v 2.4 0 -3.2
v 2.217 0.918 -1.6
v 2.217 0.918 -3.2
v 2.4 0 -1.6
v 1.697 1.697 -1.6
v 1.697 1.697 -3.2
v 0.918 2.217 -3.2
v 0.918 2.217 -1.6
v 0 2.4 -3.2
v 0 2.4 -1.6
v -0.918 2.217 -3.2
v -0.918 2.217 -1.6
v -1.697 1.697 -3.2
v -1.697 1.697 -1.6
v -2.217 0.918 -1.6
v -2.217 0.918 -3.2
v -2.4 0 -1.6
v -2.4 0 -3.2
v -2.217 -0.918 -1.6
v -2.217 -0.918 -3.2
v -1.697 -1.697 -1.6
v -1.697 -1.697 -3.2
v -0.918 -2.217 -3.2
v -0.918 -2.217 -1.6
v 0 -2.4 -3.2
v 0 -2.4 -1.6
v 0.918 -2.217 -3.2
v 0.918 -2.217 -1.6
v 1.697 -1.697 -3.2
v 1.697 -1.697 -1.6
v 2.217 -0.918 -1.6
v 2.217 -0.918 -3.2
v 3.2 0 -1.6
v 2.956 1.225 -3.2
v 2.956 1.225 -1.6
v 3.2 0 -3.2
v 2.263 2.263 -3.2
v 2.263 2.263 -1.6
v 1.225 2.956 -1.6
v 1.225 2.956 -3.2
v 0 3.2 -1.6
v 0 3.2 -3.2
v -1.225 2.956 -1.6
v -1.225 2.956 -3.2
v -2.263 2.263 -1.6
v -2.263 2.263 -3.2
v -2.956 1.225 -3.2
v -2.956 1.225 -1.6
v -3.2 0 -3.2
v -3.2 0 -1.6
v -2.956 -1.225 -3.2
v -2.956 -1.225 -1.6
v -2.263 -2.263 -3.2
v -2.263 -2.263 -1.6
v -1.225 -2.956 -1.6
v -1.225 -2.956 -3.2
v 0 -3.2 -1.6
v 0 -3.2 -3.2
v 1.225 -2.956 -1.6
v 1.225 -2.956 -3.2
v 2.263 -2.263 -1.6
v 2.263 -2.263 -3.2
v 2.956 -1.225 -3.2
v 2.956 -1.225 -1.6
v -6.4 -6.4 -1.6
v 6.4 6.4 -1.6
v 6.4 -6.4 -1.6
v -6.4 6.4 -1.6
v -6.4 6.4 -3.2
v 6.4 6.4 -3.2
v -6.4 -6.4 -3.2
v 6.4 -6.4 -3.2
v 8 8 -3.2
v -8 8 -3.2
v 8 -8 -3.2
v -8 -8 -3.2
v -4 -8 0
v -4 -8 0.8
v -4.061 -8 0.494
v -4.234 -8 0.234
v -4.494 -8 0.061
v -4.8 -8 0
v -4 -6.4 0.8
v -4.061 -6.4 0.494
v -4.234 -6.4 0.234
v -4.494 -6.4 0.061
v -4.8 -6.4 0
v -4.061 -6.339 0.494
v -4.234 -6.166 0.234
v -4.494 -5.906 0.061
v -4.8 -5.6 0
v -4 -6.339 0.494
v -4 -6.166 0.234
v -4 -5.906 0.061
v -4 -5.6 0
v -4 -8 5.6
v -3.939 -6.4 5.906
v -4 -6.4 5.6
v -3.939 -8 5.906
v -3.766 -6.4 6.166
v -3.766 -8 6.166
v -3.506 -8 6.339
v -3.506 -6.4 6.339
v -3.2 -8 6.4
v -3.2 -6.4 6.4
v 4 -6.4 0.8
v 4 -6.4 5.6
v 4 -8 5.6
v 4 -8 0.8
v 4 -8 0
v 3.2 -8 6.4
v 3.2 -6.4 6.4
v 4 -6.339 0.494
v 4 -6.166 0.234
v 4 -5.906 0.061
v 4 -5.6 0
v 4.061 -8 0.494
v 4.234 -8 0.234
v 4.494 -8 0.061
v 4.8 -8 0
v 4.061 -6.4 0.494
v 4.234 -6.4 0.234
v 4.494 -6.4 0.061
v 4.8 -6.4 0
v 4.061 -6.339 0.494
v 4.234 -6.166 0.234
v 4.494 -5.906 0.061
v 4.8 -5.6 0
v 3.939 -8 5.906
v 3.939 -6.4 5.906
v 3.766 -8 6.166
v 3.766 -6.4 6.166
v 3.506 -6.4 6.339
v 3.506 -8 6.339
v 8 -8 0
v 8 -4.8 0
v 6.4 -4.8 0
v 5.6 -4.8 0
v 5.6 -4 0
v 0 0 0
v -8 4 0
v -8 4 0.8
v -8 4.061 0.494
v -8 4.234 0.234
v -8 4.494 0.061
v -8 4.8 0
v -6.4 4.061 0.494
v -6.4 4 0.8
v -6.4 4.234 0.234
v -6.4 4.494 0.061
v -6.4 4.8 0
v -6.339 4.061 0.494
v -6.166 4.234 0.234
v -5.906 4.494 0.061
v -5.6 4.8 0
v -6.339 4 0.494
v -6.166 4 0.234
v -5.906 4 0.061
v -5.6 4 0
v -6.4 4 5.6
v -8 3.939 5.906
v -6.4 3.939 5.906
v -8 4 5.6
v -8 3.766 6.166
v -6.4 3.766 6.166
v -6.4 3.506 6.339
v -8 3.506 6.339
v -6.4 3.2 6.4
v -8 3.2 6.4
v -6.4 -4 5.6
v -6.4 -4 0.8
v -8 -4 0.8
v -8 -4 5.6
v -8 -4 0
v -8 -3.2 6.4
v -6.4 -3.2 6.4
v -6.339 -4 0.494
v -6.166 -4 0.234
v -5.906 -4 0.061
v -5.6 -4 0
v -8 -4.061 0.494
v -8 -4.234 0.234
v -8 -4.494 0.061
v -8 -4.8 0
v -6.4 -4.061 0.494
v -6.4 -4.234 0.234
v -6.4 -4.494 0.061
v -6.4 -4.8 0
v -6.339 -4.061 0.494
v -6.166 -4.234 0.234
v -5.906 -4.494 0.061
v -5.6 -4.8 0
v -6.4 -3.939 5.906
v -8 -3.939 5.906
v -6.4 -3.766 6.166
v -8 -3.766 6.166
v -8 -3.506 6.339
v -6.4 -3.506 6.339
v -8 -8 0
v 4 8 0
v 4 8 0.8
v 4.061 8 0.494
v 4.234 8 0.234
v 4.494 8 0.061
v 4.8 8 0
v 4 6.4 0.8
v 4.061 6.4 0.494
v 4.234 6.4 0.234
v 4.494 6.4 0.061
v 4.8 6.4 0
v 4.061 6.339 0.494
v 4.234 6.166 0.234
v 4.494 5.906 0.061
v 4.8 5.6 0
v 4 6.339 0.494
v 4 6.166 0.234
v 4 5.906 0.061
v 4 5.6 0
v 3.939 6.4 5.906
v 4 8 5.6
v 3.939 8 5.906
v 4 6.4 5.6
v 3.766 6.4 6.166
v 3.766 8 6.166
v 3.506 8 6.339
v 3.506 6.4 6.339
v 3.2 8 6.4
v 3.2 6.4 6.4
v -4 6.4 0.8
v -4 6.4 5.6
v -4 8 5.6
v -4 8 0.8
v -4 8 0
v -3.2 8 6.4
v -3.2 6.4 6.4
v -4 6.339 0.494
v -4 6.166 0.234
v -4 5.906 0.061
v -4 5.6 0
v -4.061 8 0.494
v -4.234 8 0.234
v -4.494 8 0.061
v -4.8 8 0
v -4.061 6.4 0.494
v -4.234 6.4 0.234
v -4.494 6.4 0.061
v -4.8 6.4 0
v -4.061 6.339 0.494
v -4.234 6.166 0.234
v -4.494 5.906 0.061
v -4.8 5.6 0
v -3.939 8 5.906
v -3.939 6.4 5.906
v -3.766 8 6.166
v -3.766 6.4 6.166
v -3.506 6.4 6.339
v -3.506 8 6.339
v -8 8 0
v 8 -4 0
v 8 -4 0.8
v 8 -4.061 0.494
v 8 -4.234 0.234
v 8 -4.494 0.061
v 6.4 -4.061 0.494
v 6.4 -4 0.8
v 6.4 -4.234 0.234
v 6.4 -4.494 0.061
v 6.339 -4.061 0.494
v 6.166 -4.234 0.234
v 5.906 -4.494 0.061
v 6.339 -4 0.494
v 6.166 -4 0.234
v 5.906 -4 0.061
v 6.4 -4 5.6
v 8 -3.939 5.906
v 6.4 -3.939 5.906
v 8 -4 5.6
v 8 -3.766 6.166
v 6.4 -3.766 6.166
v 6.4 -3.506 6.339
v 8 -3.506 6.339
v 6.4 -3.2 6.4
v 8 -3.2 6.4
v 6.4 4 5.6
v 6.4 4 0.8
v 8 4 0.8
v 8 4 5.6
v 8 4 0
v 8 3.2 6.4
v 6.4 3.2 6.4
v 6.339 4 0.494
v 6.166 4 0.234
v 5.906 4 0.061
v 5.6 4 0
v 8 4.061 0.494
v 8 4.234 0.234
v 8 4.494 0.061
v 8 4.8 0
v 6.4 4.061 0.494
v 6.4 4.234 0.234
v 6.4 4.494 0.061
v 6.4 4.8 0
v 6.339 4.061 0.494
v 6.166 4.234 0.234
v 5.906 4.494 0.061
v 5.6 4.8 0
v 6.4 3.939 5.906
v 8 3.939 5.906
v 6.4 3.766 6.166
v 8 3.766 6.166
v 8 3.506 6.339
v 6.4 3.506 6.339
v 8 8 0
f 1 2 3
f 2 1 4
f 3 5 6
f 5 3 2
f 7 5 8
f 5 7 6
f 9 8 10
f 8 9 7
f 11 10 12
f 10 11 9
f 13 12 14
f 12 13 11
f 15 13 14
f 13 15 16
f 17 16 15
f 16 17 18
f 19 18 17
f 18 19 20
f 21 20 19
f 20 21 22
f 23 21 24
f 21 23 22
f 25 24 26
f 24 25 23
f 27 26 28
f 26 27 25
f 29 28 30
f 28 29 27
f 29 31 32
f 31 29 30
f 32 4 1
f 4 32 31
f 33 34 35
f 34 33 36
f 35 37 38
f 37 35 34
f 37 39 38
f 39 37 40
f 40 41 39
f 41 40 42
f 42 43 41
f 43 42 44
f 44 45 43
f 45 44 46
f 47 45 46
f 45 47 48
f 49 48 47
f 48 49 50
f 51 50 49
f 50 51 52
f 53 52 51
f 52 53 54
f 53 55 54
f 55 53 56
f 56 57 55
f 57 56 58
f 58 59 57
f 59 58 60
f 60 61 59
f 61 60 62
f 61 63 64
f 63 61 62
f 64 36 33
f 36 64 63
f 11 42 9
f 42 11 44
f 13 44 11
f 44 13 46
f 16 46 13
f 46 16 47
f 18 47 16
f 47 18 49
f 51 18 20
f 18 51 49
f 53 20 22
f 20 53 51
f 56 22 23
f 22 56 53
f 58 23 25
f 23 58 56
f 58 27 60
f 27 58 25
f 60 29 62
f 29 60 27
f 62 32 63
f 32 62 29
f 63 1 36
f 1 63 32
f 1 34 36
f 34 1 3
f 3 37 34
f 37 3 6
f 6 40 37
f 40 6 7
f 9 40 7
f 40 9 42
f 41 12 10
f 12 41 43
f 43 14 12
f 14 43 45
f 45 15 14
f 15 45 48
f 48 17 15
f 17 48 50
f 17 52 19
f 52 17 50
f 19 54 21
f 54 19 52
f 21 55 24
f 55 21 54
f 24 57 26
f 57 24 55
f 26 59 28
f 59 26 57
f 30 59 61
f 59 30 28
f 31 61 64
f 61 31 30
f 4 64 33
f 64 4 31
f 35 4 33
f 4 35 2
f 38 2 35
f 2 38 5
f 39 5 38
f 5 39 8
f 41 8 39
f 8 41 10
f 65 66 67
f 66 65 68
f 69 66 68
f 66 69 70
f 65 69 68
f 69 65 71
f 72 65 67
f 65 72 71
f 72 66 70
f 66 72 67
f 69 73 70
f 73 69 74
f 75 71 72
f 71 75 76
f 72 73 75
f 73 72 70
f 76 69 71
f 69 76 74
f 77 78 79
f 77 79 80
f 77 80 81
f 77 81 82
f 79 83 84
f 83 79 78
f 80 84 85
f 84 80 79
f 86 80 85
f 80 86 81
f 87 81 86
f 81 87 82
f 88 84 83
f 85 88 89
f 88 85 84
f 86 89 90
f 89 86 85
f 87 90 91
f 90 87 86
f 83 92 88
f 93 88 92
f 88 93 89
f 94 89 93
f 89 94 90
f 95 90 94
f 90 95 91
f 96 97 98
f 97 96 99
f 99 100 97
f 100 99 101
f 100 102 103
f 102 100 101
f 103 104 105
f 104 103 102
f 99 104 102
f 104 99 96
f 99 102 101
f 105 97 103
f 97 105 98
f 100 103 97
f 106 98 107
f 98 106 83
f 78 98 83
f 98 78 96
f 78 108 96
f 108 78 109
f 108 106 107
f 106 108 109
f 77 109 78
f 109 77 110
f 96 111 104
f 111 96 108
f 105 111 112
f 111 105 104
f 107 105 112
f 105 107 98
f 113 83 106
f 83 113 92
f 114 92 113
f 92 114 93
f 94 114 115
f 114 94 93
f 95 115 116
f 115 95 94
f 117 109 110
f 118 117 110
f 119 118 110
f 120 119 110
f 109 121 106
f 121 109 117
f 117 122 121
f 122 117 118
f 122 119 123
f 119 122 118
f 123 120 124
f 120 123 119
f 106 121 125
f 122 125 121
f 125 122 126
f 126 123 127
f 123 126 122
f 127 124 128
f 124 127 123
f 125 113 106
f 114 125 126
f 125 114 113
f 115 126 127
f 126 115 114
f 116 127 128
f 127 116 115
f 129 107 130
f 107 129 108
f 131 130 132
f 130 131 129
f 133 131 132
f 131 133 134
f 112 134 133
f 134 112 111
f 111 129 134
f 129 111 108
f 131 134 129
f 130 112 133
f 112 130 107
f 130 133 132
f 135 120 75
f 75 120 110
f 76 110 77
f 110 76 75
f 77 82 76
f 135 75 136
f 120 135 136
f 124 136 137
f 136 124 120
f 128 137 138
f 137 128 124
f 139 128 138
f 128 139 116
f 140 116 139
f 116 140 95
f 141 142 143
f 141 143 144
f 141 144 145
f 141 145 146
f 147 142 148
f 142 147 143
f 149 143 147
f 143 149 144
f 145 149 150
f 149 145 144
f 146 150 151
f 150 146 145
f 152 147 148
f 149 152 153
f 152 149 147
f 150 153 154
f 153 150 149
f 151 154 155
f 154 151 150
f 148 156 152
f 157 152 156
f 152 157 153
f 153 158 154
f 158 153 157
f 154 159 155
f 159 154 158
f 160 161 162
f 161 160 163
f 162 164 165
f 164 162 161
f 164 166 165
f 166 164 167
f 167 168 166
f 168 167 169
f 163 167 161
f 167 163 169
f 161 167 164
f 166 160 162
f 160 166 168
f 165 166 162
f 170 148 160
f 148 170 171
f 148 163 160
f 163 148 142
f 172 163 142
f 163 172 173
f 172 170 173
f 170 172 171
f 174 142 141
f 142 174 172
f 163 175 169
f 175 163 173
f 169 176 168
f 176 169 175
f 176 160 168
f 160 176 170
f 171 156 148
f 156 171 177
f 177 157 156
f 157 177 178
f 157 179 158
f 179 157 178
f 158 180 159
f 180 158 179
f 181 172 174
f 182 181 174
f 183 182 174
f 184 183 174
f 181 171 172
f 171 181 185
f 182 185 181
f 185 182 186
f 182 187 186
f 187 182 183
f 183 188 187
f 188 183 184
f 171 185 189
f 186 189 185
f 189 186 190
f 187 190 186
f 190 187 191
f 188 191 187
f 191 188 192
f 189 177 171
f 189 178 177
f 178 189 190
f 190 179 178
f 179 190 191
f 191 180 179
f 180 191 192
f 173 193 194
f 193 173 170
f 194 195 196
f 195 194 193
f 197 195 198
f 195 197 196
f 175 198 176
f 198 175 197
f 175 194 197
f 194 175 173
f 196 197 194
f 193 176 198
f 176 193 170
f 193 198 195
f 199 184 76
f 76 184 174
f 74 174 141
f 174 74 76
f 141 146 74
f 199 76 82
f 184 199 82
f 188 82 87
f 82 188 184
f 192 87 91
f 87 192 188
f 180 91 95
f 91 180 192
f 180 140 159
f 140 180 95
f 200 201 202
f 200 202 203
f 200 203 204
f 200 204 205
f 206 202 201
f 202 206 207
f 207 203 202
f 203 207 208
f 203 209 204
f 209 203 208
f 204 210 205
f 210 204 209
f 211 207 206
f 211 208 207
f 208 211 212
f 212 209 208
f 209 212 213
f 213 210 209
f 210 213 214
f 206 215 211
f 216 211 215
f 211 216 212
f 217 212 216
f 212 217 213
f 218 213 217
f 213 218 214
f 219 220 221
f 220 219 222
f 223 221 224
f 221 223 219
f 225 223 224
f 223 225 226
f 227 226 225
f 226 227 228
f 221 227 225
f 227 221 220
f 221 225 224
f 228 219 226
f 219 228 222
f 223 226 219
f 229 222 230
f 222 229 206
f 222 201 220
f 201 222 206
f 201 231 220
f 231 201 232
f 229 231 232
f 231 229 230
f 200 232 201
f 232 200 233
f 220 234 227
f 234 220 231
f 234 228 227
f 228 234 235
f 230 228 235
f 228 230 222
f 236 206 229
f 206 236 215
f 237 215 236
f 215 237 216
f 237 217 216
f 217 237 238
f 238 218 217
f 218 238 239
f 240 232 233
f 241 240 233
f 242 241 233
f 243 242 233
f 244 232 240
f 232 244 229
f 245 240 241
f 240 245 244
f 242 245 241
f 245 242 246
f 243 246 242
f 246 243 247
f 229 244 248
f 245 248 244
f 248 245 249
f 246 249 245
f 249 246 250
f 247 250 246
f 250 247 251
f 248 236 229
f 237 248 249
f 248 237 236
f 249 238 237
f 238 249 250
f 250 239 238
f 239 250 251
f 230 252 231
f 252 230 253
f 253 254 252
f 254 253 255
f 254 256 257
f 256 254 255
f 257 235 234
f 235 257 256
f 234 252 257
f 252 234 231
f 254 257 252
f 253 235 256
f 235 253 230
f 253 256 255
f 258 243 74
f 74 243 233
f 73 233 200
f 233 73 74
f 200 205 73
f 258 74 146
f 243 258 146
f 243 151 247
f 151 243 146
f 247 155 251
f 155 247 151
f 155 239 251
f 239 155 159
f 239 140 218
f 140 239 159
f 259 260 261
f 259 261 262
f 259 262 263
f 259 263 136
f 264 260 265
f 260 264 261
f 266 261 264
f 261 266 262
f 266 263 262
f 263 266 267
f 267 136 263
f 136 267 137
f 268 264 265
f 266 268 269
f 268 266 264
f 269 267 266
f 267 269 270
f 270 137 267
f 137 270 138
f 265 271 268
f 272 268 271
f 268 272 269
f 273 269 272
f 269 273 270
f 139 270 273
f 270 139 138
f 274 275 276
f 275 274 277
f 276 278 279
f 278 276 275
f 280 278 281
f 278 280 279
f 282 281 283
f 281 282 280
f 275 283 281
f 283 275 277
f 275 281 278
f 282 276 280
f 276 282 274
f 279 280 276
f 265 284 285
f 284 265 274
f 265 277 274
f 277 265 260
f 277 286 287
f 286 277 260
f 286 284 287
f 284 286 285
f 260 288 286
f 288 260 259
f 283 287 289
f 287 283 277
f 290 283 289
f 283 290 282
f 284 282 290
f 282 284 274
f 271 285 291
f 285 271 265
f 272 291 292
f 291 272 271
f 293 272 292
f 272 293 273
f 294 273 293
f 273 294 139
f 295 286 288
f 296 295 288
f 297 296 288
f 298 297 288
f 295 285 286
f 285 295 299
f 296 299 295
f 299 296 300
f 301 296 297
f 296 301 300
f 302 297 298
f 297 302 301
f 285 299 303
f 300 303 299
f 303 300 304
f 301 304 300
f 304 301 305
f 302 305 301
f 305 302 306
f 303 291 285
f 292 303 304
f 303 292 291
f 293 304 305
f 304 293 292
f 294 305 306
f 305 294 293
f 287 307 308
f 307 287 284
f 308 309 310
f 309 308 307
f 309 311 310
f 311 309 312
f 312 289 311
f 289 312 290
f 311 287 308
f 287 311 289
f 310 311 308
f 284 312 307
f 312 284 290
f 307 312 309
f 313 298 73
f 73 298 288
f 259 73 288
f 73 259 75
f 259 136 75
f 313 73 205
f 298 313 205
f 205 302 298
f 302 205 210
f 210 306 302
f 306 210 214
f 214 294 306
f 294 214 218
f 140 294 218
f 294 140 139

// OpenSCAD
// file: ../p/4-4ring3.scad
use <../lib.scad>
$fa=1; $fs=0.2;
function ldraw_lib__4_4ring3(realsolid=false) = [
// 0 Ring  3 x 1.0
// 0 Name: 4-4ring3.dat
// 0 Author: James Jessiman
// 0 !LDRAW_ORG Primitive UPDATE 2009-01
// 0 !LICENSE Licensed under CC BY 2.0 and CC BY 4.0 : see CAreadme.txt
// 
// 0 BFC CERTIFY CCW
  [0,"BFC","CERTIFY"],
  [0,"BFC","CCW"],
// 
// 0 !HISTORY 1998-12-15 [PTadmin] Official Update 1998-10
// 0 !HISTORY 2002-04-05 [hafhead] Added BFC statement
// 0 !HISTORY 2002-04-25 [PTadmin] Official Update 2002-02
// 0 !HISTORY 2007-06-24 [PTadmin] Header formatted for Contributor Agreement
// 0 !HISTORY 2008-07-01 [PTadmin] Official Update 2008-01
// 0 !HISTORY 2008-08-26 [cwdee] Switch polygon winding and rename
// 0 !HISTORY 2009-05-02 [PTadmin] Official Update 2009-01
// 
// 
// 4 16 -1.5308 0 3.6956 -1.1481 0 2.7717 0 0 3 0 0 4
  [4,16,-1.5308,0,3.6956,-1.1481,0,2.7717,0,0,3,0,0,4],
// 4 16 -2.8284 0 2.8284 -2.1213 0 2.1213 -1.1481 0 2.7717 -1.5308 0 3.6956
  [4,16,-2.8284,0,2.8284,-2.1213,0,2.1213,-1.1481,0,2.7717,-1.5308,0,3.6956],
// 4 16 -3.6956 0 1.5308 -2.7717 0 1.1481 -2.1213 0 2.1213 -2.8284 0 2.8284
  [4,16,-3.6956,0,1.5308,-2.7717,0,1.1481,-2.1213,0,2.1213,-2.8284,0,2.8284],
// 4 16 -4 0 0 -3 0 0 -2.7717 0 1.1481 -3.6956 0 1.5308
  [4,16,-4,0,0,-3,0,0,-2.7717,0,1.1481,-3.6956,0,1.5308],
// 4 16 -3.6956 0 -1.5308 -2.7717 0 -1.1481 -3 0 0 -4 0 0
  [4,16,-3.6956,0,-1.5308,-2.7717,0,-1.1481,-3,0,0,-4,0,0],
// 4 16 -2.8284 0 -2.8284 -2.1213 0 -2.1213 -2.7717 0 -1.1481 -3.6956 0 -1.5308
  [4,16,-2.8284,0,-2.8284,-2.1213,0,-2.1213,-2.7717,0,-1.1481,-3.6956,0,-1.5308],
// 4 16 -1.5308 0 -3.6956 -1.1481 0 -2.7717 -2.1213 0 -2.1213 -2.8284 0 -2.8284
  [4,16,-1.5308,0,-3.6956,-1.1481,0,-2.7717,-2.1213,0,-2.1213,-2.8284,0,-2.8284],
// 4 16 0 0 -4 0 0 -3 -1.1481 0 -2.7717 -1.5308 0 -3.6956
  [4,16,0,0,-4,0,0,-3,-1.1481,0,-2.7717,-1.5308,0,-3.6956],
// 4 16 1.5308 0 -3.6956 1.1481 0 -2.7717 0 0 -3 0 0 -4
  [4,16,1.5308,0,-3.6956,1.1481,0,-2.7717,0,0,-3,0,0,-4],
// 4 16 2.8284 0 -2.8284 2.1213 0 -2.1213 1.1481 0 -2.7717 1.5308 0 -3.6956
  [4,16,2.8284,0,-2.8284,2.1213,0,-2.1213,1.1481,0,-2.7717,1.5308,0,-3.6956],
// 4 16 3.6956 0 -1.5308 2.7717 0 -1.1481 2.1213 0 -2.1213 2.8284 0 -2.8284
  [4,16,3.6956,0,-1.5308,2.7717,0,-1.1481,2.1213,0,-2.1213,2.8284,0,-2.8284],
// 4 16 4 0 0 3 0 0 2.7717 0 -1.1481 3.6956 0 -1.5308
  [4,16,4,0,0,3,0,0,2.7717,0,-1.1481,3.6956,0,-1.5308],
// 4 16 3.6956 0 1.5308 2.7717 0 1.1481 3 0 0 4 0 0
  [4,16,3.6956,0,1.5308,2.7717,0,1.1481,3,0,0,4,0,0],
// 4 16 2.8284 0 2.8284 2.1213 0 2.1213 2.7717 0 1.1481 3.6956 0 1.5308
  [4,16,2.8284,0,2.8284,2.1213,0,2.1213,2.7717,0,1.1481,3.6956,0,1.5308],
// 4 16 1.5308 0 3.6956 1.1481 0 2.7717 2.1213 0 2.1213 2.8284 0 2.8284
  [4,16,1.5308,0,3.6956,1.1481,0,2.7717,2.1213,0,2.1213,2.8284,0,2.8284],
// 4 16 0 0 4 0 0 3 1.1481 0 2.7717 1.5308 0 3.6956
  [4,16,0,0,4,0,0,3,1.1481,0,2.7717,1.5308,0,3.6956],
// 0
];
module ldraw_lib__4_4ring3(step=0, col=false, unit=2/5, alt=false, line=0.2, solid=!$preview)
    makepoly(ldraw_lib__4_4ring3(solid), step=step, col=col, unit=unit, alt=alt, line=line, solid=solid);
ldraw_lib__4_4ring3(line=0.2);
// file: ../p/4-4edge.scad
use <../lib.scad>
function ldraw_lib__4_4edge() = [
// 0 Circle 1.0
// 0 Name: 4-4edge.dat
// 0 Author: James Jessiman
// 0 !LDRAW_ORG Primitive UPDATE 2017-01
// 0 !LICENSE Licensed under CC BY 2.0 and CC BY 4.0 : see CAreadme.txt
// 
// 0 BFC CERTIFY CCW
  [0,"BFC","CERTIFY"],
  [0,"BFC","CCW"],
// 
// 0 !HISTORY 1998-12-15 [PTadmin] Official Update 1998-10
// 0 !HISTORY 2005-12-28 [PTadmin] Official Update 2005-01
// 0 !HISTORY 2007-06-24 [PTadmin] Header formatted for Contributor Agreement
// 0 !HISTORY 2008-07-01 [PTadmin] Official Update 2008-01
// 0 !HISTORY 2017-01-15 [Steffen] BFCed
// 0 !HISTORY 2017-12-30 [PTadmin] Official Update 2017-01
// 
// 
// 2 24 1 0 0 0.9239 0 0.3827
  [2,24,1,0,0,0.9239,0,0.3827],
// 2 24 0.9239 0 0.3827 0.7071 0 0.7071
  [2,24,0.9239,0,0.3827,0.7071,0,0.7071],
// 2 24 0.7071 0 0.7071 0.3827 0 0.9239
  [2,24,0.7071,0,0.7071,0.3827,0,0.9239],
// 2 24 0.3827 0 0.9239 0 0 1
  [2,24,0.3827,0,0.9239,0,0,1],
// 2 24 0 0 1 -0.3827 0 0.9239
  [2,24,0,0,1,-0.3827,0,0.9239],
// 2 24 -0.3827 0 0.9239 -0.7071 0 0.7071
  [2,24,-0.3827,0,0.9239,-0.7071,0,0.7071],
// 2 24 -0.7071 0 0.7071 -0.9239 0 0.3827
  [2,24,-0.7071,0,0.7071,-0.9239,0,0.3827],
// 2 24 -0.9239 0 0.3827 -1 0 -0
  [2,24,-0.9239,0,0.3827,-1,0,-0],
// 2 24 -1 0 -0 -0.9239 0 -0.3827
  [2,24,-1,0,-0,-0.9239,0,-0.3827],
// 2 24 -0.9239 0 -0.3827 -0.7071 0 -0.7071
  [2,24,-0.9239,0,-0.3827,-0.7071,0,-0.7071],
// 2 24 -0.7071 0 -0.7071 -0.3827 0 -0.9239
  [2,24,-0.7071,0,-0.7071,-0.3827,0,-0.9239],
// 2 24 -0.3827 0 -0.9239 0 0 -1
  [2,24,-0.3827,0,-0.9239,0,0,-1],
// 2 24 0 0 -1 0.3827 0 -0.9239
  [2,24,0,0,-1,0.3827,0,-0.9239],
// 2 24 0.3827 0 -0.9239 0.7071 0 -0.7071
  [2,24,0.3827,0,-0.9239,0.7071,0,-0.7071],
// 2 24 0.7071 0 -0.7071 0.9239 0 -0.3827
  [2,24,0.7071,0,-0.7071,0.9239,0,-0.3827],
// 2 24 0.9239 0 -0.3827 1 0 0
  [2,24,0.9239,0,-0.3827,1,0,0],
];
module ldraw_lib__4_4edge(step=0, col=false, unit=2/5, alt=false, line=0.2, solid=!$preview)
    makepoly(ldraw_lib__4_4edge(), step=step, col=col, unit=unit, alt=alt, line=line, solid=solid);
ldraw_lib__4_4edge(line=0.2);
// file: ../p/4-4cyli.scad
use <../lib.scad>
$fa=1; $fs=0.2;
function ldraw_lib__4_4cyli(realsolid=false) = [
// 0 Cylinder 1.0
// 0 Name: 4-4cyli.dat
// 0 Author: James Jessiman
// 0 !LDRAW_ORG Primitive UPDATE 2005-01
// 0 !LICENSE Licensed under CC BY 2.0 and CC BY 4.0 : see CAreadme.txt
// 
// 0 BFC CERTIFY CCW
  [0,"BFC","CERTIFY"],
  [0,"BFC","CCW"],
// 
// 0 !HISTORY 1998-12-15 [PTadmin] Official Update 1998-10
// 0 !HISTORY 2002-03-23 [sbliss] Added BFC statement; merged headers from files in distributions LDraw 0.27 and Complete.
// 0 !HISTORY 2002-04-25 [PTadmin] Official Update 2002-02
// 0 !HISTORY 2004-12-14 [guyvivan] BFC CCW
// 0 !HISTORY 2005-12-28 [PTadmin] Official Update 2005-01
// 0 !HISTORY 2007-06-24 [PTadmin] Header formatted for Contributor Agreement
// 0 !HISTORY 2008-07-01 [PTadmin] Official Update 2008-01
// 
// 
// 4 16 1 1 0 0.9239 1 0.3827 0.9239 0 0.3827 1 0 0
  [4,16,1,1,0,0.9239,1,0.3827,0.9239,0,0.3827,1,0,0],
// 5 24 1 0 0 1 1 0 0.9239 0 0.3827 0.9239 0 -0.3827
  [5,24,1,0,0,1,1,0,0.9239,0,0.3827,0.9239,0,-0.3827],
// 4 16 0.9239 1 0.3827 0.7071 1 0.7071 0.7071 0 0.7071 0.9239 0 0.3827
  [4,16,0.9239,1,0.3827,0.7071,1,0.7071,0.7071,0,0.7071,0.9239,0,0.3827],
// 5 24 0.9239 0 0.3827 0.9239 1 0.3827 0.7071 0 0.7071 1 0 0
  [5,24,0.9239,0,0.3827,0.9239,1,0.3827,0.7071,0,0.7071,1,0,0],
// 4 16 0.7071 1 0.7071 0.3827 1 0.9239 0.3827 0 0.9239 0.7071 0 0.7071
  [4,16,0.7071,1,0.7071,0.3827,1,0.9239,0.3827,0,0.9239,0.7071,0,0.7071],
// 5 24 0.7071 0 0.7071 0.7071 1 0.7071 0.3827 0 0.9239 0.9239 0 0.3827
  [5,24,0.7071,0,0.7071,0.7071,1,0.7071,0.3827,0,0.9239,0.9239,0,0.3827],
// 4 16 0.3827 1 0.9239 0 1 1 0 0 1 0.3827 0 0.9239
  [4,16,0.3827,1,0.9239,0,1,1,0,0,1,0.3827,0,0.9239],
// 5 24 0.3827 0 0.9239 0.3827 1 0.9239 0 0 1 0.7071 0 0.7071
  [5,24,0.3827,0,0.9239,0.3827,1,0.9239,0,0,1,0.7071,0,0.7071],
// 4 16 0 1 1 -0.3827 1 0.9239 -0.3827 0 0.9239 0 0 1
  [4,16,0,1,1,-0.3827,1,0.9239,-0.3827,0,0.9239,0,0,1],
// 5 24 0 0 1 0 1 1 -0.3827 0 0.9239 0.3827 0 0.9239
  [5,24,0,0,1,0,1,1,-0.3827,0,0.9239,0.3827,0,0.9239],
// 4 16 -0.3827 1 0.9239 -0.7071 1 0.7071 -0.7071 0 0.7071 -0.3827 0 0.9239
  [4,16,-0.3827,1,0.9239,-0.7071,1,0.7071,-0.7071,0,0.7071,-0.3827,0,0.9239],
// 5 24 -0.3827 0 0.9239 -0.3827 1 0.9239 -0.7071 0 0.7071 0 0 1
  [5,24,-0.3827,0,0.9239,-0.3827,1,0.9239,-0.7071,0,0.7071,0,0,1],
// 4 16 -0.7071 1 0.7071 -0.9239 1 0.3827 -0.9239 0 0.3827 -0.7071 0 0.7071
  [4,16,-0.7071,1,0.7071,-0.9239,1,0.3827,-0.9239,0,0.3827,-0.7071,0,0.7071],
// 5 24 -0.7071 0 0.7071 -0.7071 1 0.7071 -0.9239 0 0.3827 -0.3827 0 0.9239
  [5,24,-0.7071,0,0.7071,-0.7071,1,0.7071,-0.9239,0,0.3827,-0.3827,0,0.9239],
// 4 16 -0.9239 1 0.3827 -1 1 0 -1 0 0 -0.9239 0 0.3827
  [4,16,-0.9239,1,0.3827,-1,1,0,-1,0,0,-0.9239,0,0.3827],
// 5 24 -0.9239 0 0.3827 -0.9239 1 0.3827 -1 0 0 -0.7071 0 0.7071
  [5,24,-0.9239,0,0.3827,-0.9239,1,0.3827,-1,0,0,-0.7071,0,0.7071],
// 4 16 -1 1 0 -0.9239 1 -0.3827 -0.9239 0 -0.3827 -1 0 0
  [4,16,-1,1,0,-0.9239,1,-0.3827,-0.9239,0,-0.3827,-1,0,0],
// 5 24 -1 0 0 -1 1 0 -0.9239 0 -0.3827 -0.9239 0 0.3827
  [5,24,-1,0,0,-1,1,0,-0.9239,0,-0.3827,-0.9239,0,0.3827],
// 4 16 -0.9239 1 -0.3827 -0.7071 1 -0.7071 -0.7071 0 -0.7071 -0.9239 0 -0.3827
  [4,16,-0.9239,1,-0.3827,-0.7071,1,-0.7071,-0.7071,0,-0.7071,-0.9239,0,-0.3827],
// 5 24 -0.9239 0 -0.3827 -0.9239 1 -0.3827 -0.7071 0 -0.7071 -1 0 0
  [5,24,-0.9239,0,-0.3827,-0.9239,1,-0.3827,-0.7071,0,-0.7071,-1,0,0],
// 4 16 -0.7071 1 -0.7071 -0.3827 1 -0.9239 -0.3827 0 -0.9239 -0.7071 0 -0.7071
  [4,16,-0.7071,1,-0.7071,-0.3827,1,-0.9239,-0.3827,0,-0.9239,-0.7071,0,-0.7071],
// 5 24 -0.7071 0 -0.7071 -0.7071 1 -0.7071 -0.3827 0 -0.9239 -0.9239 0 -0.3827
  [5,24,-0.7071,0,-0.7071,-0.7071,1,-0.7071,-0.3827,0,-0.9239,-0.9239,0,-0.3827],
// 4 16 -0.3827 1 -0.9239 0 1 -1 0 0 -1 -0.3827 0 -0.9239
  [4,16,-0.3827,1,-0.9239,0,1,-1,0,0,-1,-0.3827,0,-0.9239],
// 5 24 -0.3827 0 -0.9239 -0.3827 1 -0.9239 0 0 -1 -0.7071 0 -0.7071
  [5,24,-0.3827,0,-0.9239,-0.3827,1,-0.9239,0,0,-1,-0.7071,0,-0.7071],
// 4 16 0 1 -1 0.3827 1 -0.9239 0.3827 0 -0.9239 0 0 -1
  [4,16,0,1,-1,0.3827,1,-0.9239,0.3827,0,-0.9239,0,0,-1],
// 5 24 0 0 -1 0 1 -1 0.3827 0 -0.9239 -0.3827 0 -0.9239
  [5,24,0,0,-1,0,1,-1,0.3827,0,-0.9239,-0.3827,0,-0.9239],
// 4 16 0.3827 1 -0.9239 0.7071 1 -0.7071 0.7071 0 -0.7071 0.3827 0 -0.9239
  [4,16,0.3827,1,-0.9239,0.7071,1,-0.7071,0.7071,0,-0.7071,0.3827,0,-0.9239],
// 5 24 0.3827 0 -0.9239 0.3827 1 -0.9239 0.7071 0 -0.7071 0 0 -1
  [5,24,0.3827,0,-0.9239,0.3827,1,-0.9239,0.7071,0,-0.7071,0,0,-1],
// 4 16 0.7071 1 -0.7071 0.9239 1 -0.3827 0.9239 0 -0.3827 0.7071 0 -0.7071
  [4,16,0.7071,1,-0.7071,0.9239,1,-0.3827,0.9239,0,-0.3827,0.7071,0,-0.7071],
// 5 24 0.7071 0 -0.7071 0.7071 1 -0.7071 0.9239 0 -0.3827 0.3827 0 -0.9239
  [5,24,0.7071,0,-0.7071,0.7071,1,-0.7071,0.9239,0,-0.3827,0.3827,0,-0.9239],
// 4 16 0.9239 1 -0.3827 1 1 0 1 0 0 0.9239 0 -0.3827
  [4,16,0.9239,1,-0.3827,1,1,0,1,0,0,0.9239,0,-0.3827],
// 5 24 0.9239 0 -0.3827 0.9239 1 -0.3827 1 0 0 0.7071 0 -0.7071
  [5,24,0.9239,0,-0.3827,0.9239,1,-0.3827,1,0,0,0.7071,0,-0.7071],
// 0
];
module ldraw_lib__4_4cyli(step=0, col=false, unit=2/5, alt=false, line=0.2, solid=!$preview)
    makepoly(ldraw_lib__4_4cyli(solid), step=step, col=col, unit=unit, alt=alt, line=line, solid=solid);
ldraw_lib__4_4cyli(line=0.2);
// file: ../p/box4o8a.scad
use <../lib.scad>
function ldraw_lib__box4o8a() = [
// 0 Box with 4 Faces (2 Parallel Pairs) without Top and Bottom Edges
// 0 Name: box4o8a.dat
// 0 Author: Steffen [Steffen]
// 0 !LDRAW_ORG Primitive UPDATE 2012-01
// 0 !LICENSE Licensed under CC BY 2.0 and CC BY 4.0 : see CAreadme.txt
// 
// 0 BFC CERTIFY CCW
  [0,"BFC","CERTIFY"],
  [0,"BFC","CCW"],
// 
// 0 !HISTORY 2004-04-22 [PTadmin] Official Update 2004-02
// 0 !HISTORY 2007-06-24 [PTadmin] Header formatted for Contributor Agreement
// 0 !HISTORY 2008-07-01 [PTadmin] Official Update 2008-01
// 0 !HISTORY 2012-02-16 [Philo] Changed to CCW
// 0 !HISTORY 2012-03-30 [PTadmin] Official Update 2012-01
// 
// 
// 2 24 1 0 1 1 1 1
  [2,24,1,0,1,1,1,1],
// 2 24 -1 0 1 -1 1 1
  [2,24,-1,0,1,-1,1,1],
// 2 24 1 0 -1 1 1 -1
  [2,24,1,0,-1,1,1,-1],
// 2 24 -1 0 -1 -1 1 -1
  [2,24,-1,0,-1,-1,1,-1],
// 4 16 -1 1 1 -1 0 1 1 0 1 1 1 1
  [4,16,-1,1,1,-1,0,1,1,0,1,1,1,1],
// 4 16 -1 1 -1 -1 0 -1 -1 0 1 -1 1 1
  [4,16,-1,1,-1,-1,0,-1,-1,0,1,-1,1,1],
// 4 16 1 1 -1 1 0 -1 -1 0 -1 -1 1 -1
  [4,16,1,1,-1,1,0,-1,-1,0,-1,-1,1,-1],
// 4 16 1 1 1 1 0 1 1 0 -1 1 1 -1
  [4,16,1,1,1,1,0,1,1,0,-1,1,1,-1],
];
makepoly(ldraw_lib__box4o8a(), line=0.2);
// file: ../p/1-4ndis.scad
use <../lib.scad>
function ldraw_lib__1_4ndis() = [
// 0 Disc Negative 0.25
// 0 Name: 1-4ndis.dat
// 0 Author: James Jessiman
// 0 !LDRAW_ORG Primitive UPDATE 2012-01
// 0 !LICENSE Licensed under CC BY 2.0 and CC BY 4.0 : see CAreadme.txt
// 
// 0 BFC CERTIFY CCW
  [0,"BFC","CERTIFY"],
  [0,"BFC","CCW"],
// 
// 0 !HISTORY 2002-03-23 [sbliss] Added BFC Statement
// 0 !HISTORY 2002-04-25 [PTadmin] Official Update 2002-02
// 0 !HISTORY 2007-06-22 [PTadmin] Header formatted for Contributor Agreement
// 0 !HISTORY 2008-07-01 [PTadmin] Official Update 2008-01
// 0 !HISTORY 2012-02-16 [Philo] Changed to CCW
// 0 !HISTORY 2012-03-30 [PTadmin] Official Update 2012-01
// 
// 
// 3 16 0.9239 0 0.3827 1 0 0 1 0 1
  [3,16,0.9239,0,0.3827,1,0,0,1,0,1],
// 3 16 0.7071 0 0.7071 0.9239 0 0.3827 1 0 1
  [3,16,0.7071,0,0.7071,0.9239,0,0.3827,1,0,1],
// 3 16 0.3827 0 0.9239 0.7071 0 0.7071 1 0 1
  [3,16,0.3827,0,0.9239,0.7071,0,0.7071,1,0,1],
// 3 16 0 0 1 0.3827 0 0.9239 1 0 1
  [3,16,0,0,1,0.3827,0,0.9239,1,0,1],
];
module ldraw_lib__1_4ndis(step=0, col=false, unit=2/5, alt=false, line=0.2, solid=!$preview)
    makepoly(ldraw_lib__1_4ndis(), step=step, col=col, unit=unit, alt=alt, line=line, solid=solid);
ldraw_lib__1_4ndis(line=0.2);
// file: ../p/1-4edge.scad
use <../lib.scad>
$fa=1; $fs=0.2;
function ldraw_lib__1_4edge(realsolid=false) = [
// 0 Circle 0.25
// 0 Name: 1-4edge.dat
// 0 Author: James Jessiman
// 0 !LDRAW_ORG Primitive UPDATE 2017-01
// 0 !LICENSE Licensed under CC BY 2.0 and CC BY 4.0 : see CAreadme.txt
// 
// 0 BFC CERTIFY CCW
  [0,"BFC","CERTIFY"],
  [0,"BFC","CCW"],
// 
// 0 !HISTORY 2007-06-22 [PTadmin] Header formatted for Contributor Agreement
// 0 !HISTORY 2008-07-01 [PTadmin] Official Update 2008-01
// 0 !HISTORY 2017-01-15 [Steffen] BFCed
// 0 !HISTORY 2017-12-30 [PTadmin] Official Update 2017-01
// 
// 
// 2 24 1 0 0 0.9239 0 0.3827
  [2,24,1,0,0,0.9239,0,0.3827],
// 2 24 0.9239 0 0.3827 0.7071 0 0.7071
  [2,24,0.9239,0,0.3827,0.7071,0,0.7071],
// 2 24 0.7071 0 0.7071 0.3827 0 0.9239
  [2,24,0.7071,0,0.7071,0.3827,0,0.9239],
// 2 24 0.3827 0 0.9239 0 0 1
  [2,24,0.3827,0,0.9239,0,0,1],
];
module ldraw_lib__1_4edge(step=0, col=false, unit=2/5, alt=false, line=0.2, solid=!$preview)
    makepoly(ldraw_lib__1_4edge(solid), step=step, col=col, unit=unit, alt=alt, line=line, solid=solid);
ldraw_lib__1_4edge(line=0.2);
// file: ../p/1-4cyls.scad
use <../lib.scad>
function ldraw_lib__1_4cyls() = [
// 0 Cylinder Sloped 0.25
// 0 Name: 1-4cyls.dat
// 0 Author: James Jessiman
// 0 !LDRAW_ORG Primitive UPDATE 2012-01
// 0 !LICENSE Licensed under CC BY 4.0 : see CAreadme.txt
// 
// 0 BFC CERTIFY CCW
  [0,"BFC","CERTIFY"],
  [0,"BFC","CCW"],
// 
// 0 !HISTORY 1998-12-15 [PTadmin] Official Update 1998-10
// 0 !HISTORY 2002-07-03 [sbliss] Added BFC statement
// 0 !HISTORY 2002-08-18 [PTadmin] Official Update 2002-04
// 0 !HISTORY 2007-06-22 [PTadmin] Header formatted for Contributor Agreement
// 0 !HISTORY 2008-07-01 [PTadmin] Official Update 2008-01
// 0 !HISTORY 2012-02-16 [Philo] Changed to CCW
// 0 !HISTORY 2012-03-30 [PTadmin] Official Update 2012-01
// 
// 
// 3 16 0.9239 0.0761 0.3827 0.9239 0 0.3827 1 0 0
  [3,16,0.9239,0.0761,0.3827,0.9239,0,0.3827,1,0,0],
// 4 16 0.9239 0.0761 0.3827 0.7071 0.2929 0.7071 0.7071 0 0.7071 0.9239 0 0.3827
  [4,16,0.9239,0.0761,0.3827,0.7071,0.2929,0.7071,0.7071,0,0.7071,0.9239,0,0.3827],
// 4 16 0.7071 0.2929 0.7071 0.3827 0.6173 0.9239 0.3827 0 0.9239 0.7071 0 0.7071
  [4,16,0.7071,0.2929,0.7071,0.3827,0.6173,0.9239,0.3827,0,0.9239,0.7071,0,0.7071],
// 4 16 0.3827 0.6173 0.9239 0 1 1 0 0 1 0.3827 0 0.9239
  [4,16,0.3827,0.6173,0.9239,0,1,1,0,0,1,0.3827,0,0.9239],
// 
// 5 24 0.9239 0 0.3827 0.9239 0.0761 0.3827 0.7071 0 0.7071 1 0 0
  [5,24,0.9239,0,0.3827,0.9239,0.0761,0.3827,0.7071,0,0.7071,1,0,0],
// 5 24 0.7071 0 0.7071 0.7071 0.2929 0.7071 0.3827 0 0.9239 0.9239 0 0.3827
  [5,24,0.7071,0,0.7071,0.7071,0.2929,0.7071,0.3827,0,0.9239,0.9239,0,0.3827],
// 5 24 0.3827 0 0.9239 0.3827 0.6173 0.9239 0 0 1 0.7071 0 0.7071
  [5,24,0.3827,0,0.9239,0.3827,0.6173,0.9239,0,0,1,0.7071,0,0.7071],
// 5 24 0 0 1 0 1 1 0.3827 0 0.9239 -1 0 1
  [5,24,0,0,1,0,1,1,0.3827,0,0.9239,-1,0,1],
];
module ldraw_lib__1_4cyls(step=0, col=false, unit=2/5, alt=false, line=0.2, solid=!$preview)
    makepoly(ldraw_lib__1_4cyls(), step=step, col=col, unit=unit, alt=alt, line=line, solid=solid);
ldraw_lib__1_4cyls(line=0.2);
// file: ../p/1-4cylo.scad
use <../lib.scad>
use <1-4cyli.scad>
use <1-4edge.scad>
$fa=1; $fs=0.2;
function ldraw_lib__1_4cylo(realsolid=false) = [
// 0 Cylinder Open 0.25
// 0 Name: 1-4cylo.dat
// 0 Author: Max Martin Richter [MMR1988]
// 0 !LDRAW_ORG Primitive UPDATE 2010-03
// 0 !LICENSE Licensed under CC BY 2.0 and CC BY 4.0 : see CAreadme.txt
// 
// 0 BFC CERTIFY CCW
  [0,"BFC","CERTIFY"],
  [0,"BFC","CCW"],
// 
// 0 !HISTORY 2010-12-31 [PTadmin] Official Update 2010-03
// 
// 
// 1 16 0 0 0 1 0 0 0 1 0 0 0 1 1-4edge.dat
  [1,16,0,0,0,1,0,0,0,1,0,0,0,1, ldraw_lib__1_4edge(realsolid)],
// 1 16 0 1 0 1 0 0 0 1 0 0 0 1 1-4edge.dat
  [1,16,0,1,0,1,0,0,0,1,0,0,0,1, ldraw_lib__1_4edge(realsolid)],
// 1 16 0 0 0 1 0 0 0 1 0 0 0 1 1-4cyli.dat
  [1,16,0,0,0,1,0,0,0,1,0,0,0,1, ldraw_lib__1_4cyli(realsolid)],
];
module ldraw_lib__1_4cylo(step=0, col=false, unit=2/5, alt=false, line=0.2, solid=!$preview)
    makepoly(ldraw_lib__1_4cylo(solid), step=step, col=col, unit=unit, alt=alt, line=line, solid=solid);
ldraw_lib__1_4cylo(line=0.2);
// file: ../p/1-4cyli.scad
use <../lib.scad>
function ldraw_lib__1_4cyli() = [
// 0 Cylinder 0.25
// 0 Name: 1-4cyli.dat
// 0 Author: James Jessiman
// 0 !LDRAW_ORG Primitive UPDATE 2012-01
// 0 !LICENSE Licensed under CC BY 2.0 and CC BY 4.0 : see CAreadme.txt
// 
// 0 BFC CERTIFY CCW
  [0,"BFC","CERTIFY"],
  [0,"BFC","CCW"],
// 
// 0 !HISTORY 2002-03-23 [sbliss] Added BFC statement.
// 0 !HISTORY 2002-04-25 [PTadmin] Official Update 2002-02
// 0 !HISTORY 2007-06-22 [PTadmin] Header formatted for Contributor Agreement
// 0 !HISTORY 2008-07-01 [PTadmin] Official Update 2008-01
// 0 !HISTORY 2012-02-16 [Philo] Changed to CCW
// 0 !HISTORY 2012-03-30 [PTadmin] Official Update 2012-01
// 
// 
// 4 16 1 1 0 0.9239 1 0.3827 0.9239 0 0.3827 1 0 0
  [4,16,1,1,0,0.9239,1,0.3827,0.9239,0,0.3827,1,0,0],
// 5 24 1 0 0 1 1 0 0.9239 0 0.3827 1 0 -1
  [5,24,1,0,0,1,1,0,0.9239,0,0.3827,1,0,-1],
// 4 16 0.9239 1 0.3827 0.7071 1 0.7071 0.7071 0 0.7071 0.9239 0 0.3827
  [4,16,0.9239,1,0.3827,0.7071,1,0.7071,0.7071,0,0.7071,0.9239,0,0.3827],
// 5 24 0.9239 0 0.3827 0.9239 1 0.3827 0.7071 0 0.7071 1 0 0
  [5,24,0.9239,0,0.3827,0.9239,1,0.3827,0.7071,0,0.7071,1,0,0],
// 4 16 0.7071 1 0.7071 0.3827 1 0.9239 0.3827 0 0.9239 0.7071 0 0.7071
  [4,16,0.7071,1,0.7071,0.3827,1,0.9239,0.3827,0,0.9239,0.7071,0,0.7071],
// 5 24 0.7071 0 0.7071 0.7071 1 0.7071 0.3827 0 0.9239 0.9239 0 0.3827
  [5,24,0.7071,0,0.7071,0.7071,1,0.7071,0.3827,0,0.9239,0.9239,0,0.3827],
// 4 16 0.3827 1 0.9239 0 1 1 0 0 1 0.3827 0 0.9239
  [4,16,0.3827,1,0.9239,0,1,1,0,0,1,0.3827,0,0.9239],
// 5 24 0.3827 0 0.9239 0.3827 1 0.9239 0 0 1 0.7071 0 0.7071
  [5,24,0.3827,0,0.9239,0.3827,1,0.9239,0,0,1,0.7071,0,0.7071],
// 5 24 0 0 1 0 1 1 0.3827 0 0.9239 -1 0 1
  [5,24,0,0,1,0,1,1,0.3827,0,0.9239,-1,0,1],
];
module ldraw_lib__1_4cyli(step=0, col=false, unit=2/5, alt=false, line=0.2, solid=!$preview)
    makepoly(ldraw_lib__1_4cyli(), step=step, col=col, unit=unit, alt=alt, line=line, solid=solid);
ldraw_lib__1_4cyli(line=0.2);
// file: ../p/1-4chrd.scad
use <../lib.scad>
$fa=1; $fs=0.2;
function ldraw_lib__1_4chrd(realsolid=false) = [
// 0 Chord 0.25
// 0 Name: 1-4chrd.dat
// 0 Author: Tony Hafner [hafhead]
// 0 !LDRAW_ORG Primitive UPDATE 2012-02
// 0 !LICENSE Licensed under CC BY 2.0 and CC BY 4.0 : see CAreadme.txt
// 
// 0 BFC CERTIFY CCW
  [0,"BFC","CERTIFY"],
  [0,"BFC","CCW"],
// 
// 0 !HISTORY 2004-04-22 [PTadmin] Official Update 2004-02
// 0 !HISTORY 2007-10-09 [PTadmin] Header formatted for Contributor Agreement
// 0 !HISTORY 2008-07-01 [PTadmin] Official Update 2008-01
// 0 !HISTORY 2012-08-02 [MMR1988] Re-creation with PrimGen2 and Rectifier
// 0 !HISTORY 2012-08-09 [PTadmin] Official Update 2012-02
// 
// 
// 4 16 0.9239 0 0.3827 0.3827 0 0.9239 0 0 1 1 0 0
  [4,16,0.9239,0,0.3827,0.3827,0,0.9239,0,0,1,1,0,0],
// 3 16 0.7071 0 0.7071 0.3827 0 0.9239 0.9239 0 0.3827
  [3,16,0.7071,0,0.7071,0.3827,0,0.9239,0.9239,0,0.3827],
];
module ldraw_lib__1_4chrd(step=0, col=false, unit=2/5, alt=false, line=0.2, solid=!$preview)
    makepoly(ldraw_lib__1_4chrd(solid), step=step, col=col, unit=unit, alt=alt, line=line, solid=solid);
ldraw_lib__1_4chrd(line=0.2);
// file: ../p/stud4.scad
use <../lib.scad>
use <4-4cyli.scad>
use <4-4edge.scad>
use <4-4ring3.scad>
function ldraw_lib__stud4() = [
// 0 Stud Tube Open
// 0 Name: stud4.dat
// 0 Author: James Jessiman
// 0 !LDRAW_ORG Primitive UPDATE 2009-02
// 0 !LICENSE Licensed under CC BY 4.0 : see CAreadme.txt
// 
// 0 BFC CERTIFY CCW
  [0,"BFC","CERTIFY"],
  [0,"BFC","CCW"],
// 
// 0 !HISTORY 1999-07-05 [PTadmin] Official Update 1999-05
// 0 !HISTORY 2002-04-04 [sbliss] Modified for BFC compliance
// 0 !HISTORY 2002-04-25 [PTadmin] Official Update 2002-02
// 0 !HISTORY 2007-06-24 [PTadmin] Header formatted for Contributor Agreement
// 0 !HISTORY 2008-07-01 [PTadmin] Official Update 2008-01
// 0 !HISTORY 2009-06-21 [cwdee] Update ring references to 4-4ring
// 0 !HISTORY 2009-09-03 [PTadmin] Official Update 2009-02
// 
// 
// 1 16 0 -4 0 6 0 0 0 1 0 0 0 6 4-4edge.dat
  [1,16,0,-4,0,6,0,0,0,1,0,0,0,6, ldraw_lib__4_4edge()],
// 1 16 0 -4 0 8 0 0 0 1 0 0 0 8 4-4edge.dat
  [1,16,0,-4,0,8,0,0,0,1,0,0,0,8, ldraw_lib__4_4edge()],
// 1 16 0 0 0 6 0 0 0 1 0 0 0 6 4-4edge.dat
  [1,16,0,0,0,6,0,0,0,1,0,0,0,6, ldraw_lib__4_4edge()],
// 1 16 0 0 0 8 0 0 0 1 0 0 0 8 4-4edge.dat
  [1,16,0,0,0,8,0,0,0,1,0,0,0,8, ldraw_lib__4_4edge()],
// 0 BFC INVERTNEXT
  [0,"BFC","INVERTNEXT"],
// 1 16 0 -4 0 6 0 0 0 4 0 0 0 6 4-4cyli.dat
  [1,16,0,-4,0,6,0,0,0,4,0,0,0,6, ldraw_lib__4_4cyli()],
// 1 16 0 -4 0 8 0 0 0 4 0 0 0 8 4-4cyli.dat
  [1,16,0,-4,0,8,0,0,0,4,0,0,0,8, ldraw_lib__4_4cyli()],
// 1 16 0 -4 0 2 0 0 0 1 0 0 0 2 4-4ring3.dat
  [1,16,0,-4,0,2,0,0,0,1,0,0,0,2, ldraw_lib__4_4ring3()],
  [-1,16,0,0,0,2,0,0,0,-1,0,0,0,2, ldraw_lib__4_4ring3()],
// 0
];
module ldraw_lib__stud4(step=0, col=false, unit=2/5, alt=false, line=0.2, solid=!$preview)
    makepoly(ldraw_lib__stud4(), step=step, col=col, unit=unit, alt=alt, line=line, solid=solid);
ldraw_lib__stud4(line=0.2);
// file: s/3130s01.scad
use <../../lib.scad>
use <../../p/1-4chrd.scad>
use <../../p/1-4cyli.scad>
use <../../p/1-4cylo.scad>
use <../../p/1-4cyls.scad>
use <../../p/1-4edge.scad>
use <../../p/1-4ndis.scad>
use <../../p/box4o8a.scad>
function ldraw_lib__s__3130s01() = [
// 0 ~Panel  2 x  2 x  1 Side Panels - Quarter
// 0 Name: s\3130s01.dat
// 0 Author: Gerald Lasser [GeraldLasser]
// 0 !LDRAW_ORG Subpart UPDATE 2024-06
// 0 !LICENSE Licensed under CC BY 4.0 : see CAreadme.txt
// 
// 0 BFC CERTIFY CCW
  [0,"BFC","CERTIFY"],
  [0,"BFC","CCW"],
// 
// 0 !HISTORY 2024-07-29 [OrionP] Official Update 2024-06
// 
// 
// 1 16 -12 -2 -20 2 0 0 0 0 2 0 1 0 1-4ndis.dat
  [1,16,-12,-2,-20,2,0,0,0,0,2,0,1,0, ldraw_lib__1_4ndis()],
// 1 16 -12 -2 -20 2 0 0 0 0 2 0 1 0 1-4edge.dat
  [1,16,-12,-2,-20,2,0,0,0,0,2,0,1,0, ldraw_lib__1_4edge()],
// 0 BFC INVERTNEXT
  [0,"BFC","INVERTNEXT"],
// 1 16 -12 -2 -20 2 0 0 0 0 2 0 4 0 1-4cyli.dat
  [1,16,-12,-2,-20,2,0,0,0,0,2,0,4,0, ldraw_lib__1_4cyli()],
// 0 BFC INVERTNEXT
  [0,"BFC","INVERTNEXT"],
// 1 16 -12 -2 -16 2 0 0 0 0 2 0 2 0 1-4cyls.dat
  [1,16,-12,-2,-16,2,0,0,0,0,2,0,2,0, ldraw_lib__1_4cyls()],
// 0 BFC INVERTNEXT
  [0,"BFC","INVERTNEXT"],
// 1 16 -10 -2 -14 0 -2 0 0 0 2 -2 0 0 1-4cyls.dat
  [1,16,-10,-2,-14,0,-2,0,0,0,2,-2,0,0, ldraw_lib__1_4cyls()],
// 1 16 -12 -2 -14 2 0 0 0 0 2 -2 1 0 1-4edge.dat
  [1,16,-12,-2,-14,2,0,0,0,0,2,-2,1,0, ldraw_lib__1_4edge()],
// 
// 1 16 -8 -14 -20 -2 0 0 0 0 -2 0 4 0 1-4cylo.dat
  [1,16,-8,-14,-20,-2,0,0,0,0,-2,0,4,0, ldraw_lib__1_4cylo()],
// 1 16 -8 -14 -20 -2 0 0 0 0 -2 0 1 0 1-4chrd.dat
  [1,16,-8,-14,-20,-2,0,0,0,0,-2,0,1,0, ldraw_lib__1_4chrd()],
// 1 16 -8 -14 -16 -2 0 0 0 0 -2 0 -1 0 1-4chrd.dat
  [1,16,-8,-14,-16,-2,0,0,0,0,-2,0,-1,0, ldraw_lib__1_4chrd()],
// 
// 1 16 0 -14 -18 10 0 0 0 12 0 0 0 2 box4o8a.dat
  [1,16,0,-14,-18,10,0,0,0,12,0,0,0,2, ldraw_lib__box4o8a()],
// 4 16 10 0 -20 10 -2 -20 -10 -2 -20 -10 0 -20
  [4,16,10,0,-20,10,-2,-20,-10,-2,-20,-10,0,-20],
// 4 16 10 -14 -20 8 -16 -20 -8 -16 -20 -10 -14 -20
  [4,16,10,-14,-20,8,-16,-20,-8,-16,-20,-10,-14,-20],
// 4 16 8 -16 -16 -8 -16 -16 -8 -16 -20 8 -16 -20
  [4,16,8,-16,-16,-8,-16,-16,-8,-16,-20,8,-16,-20],
// 2 24 -8 -16 -16 8 -16 -16
  [2,24,-8,-16,-16,8,-16,-16],
// 2 24 8 -16 -20 -8 -16 -20
  [2,24,8,-16,-20,-8,-16,-20],
// 4 16 -10 -14 -16 -8 -16 -16 8 -16 -16 10 -14 -16
  [4,16,-10,-14,-16,-8,-16,-16,8,-16,-16,10,-14,-16],
// 0 BFC INVERTNEXT
  [0,"BFC","INVERTNEXT"],
// 1 16 -10 -2 -14 0 20 0 0 0 2 -2 0 0 1-4cyli.dat
  [1,16,-10,-2,-14,0,20,0,0,0,2,-2,0,0, ldraw_lib__1_4cyli()],
// 
// 1 16 12 -2 -20 -2 0 0 0 0 2 0 1 0 1-4ndis.dat
  [1,16,12,-2,-20,-2,0,0,0,0,2,0,1,0, ldraw_lib__1_4ndis()],
// 1 16 12 -2 -20 -2 0 0 0 0 2 0 1 0 1-4edge.dat
  [1,16,12,-2,-20,-2,0,0,0,0,2,0,1,0, ldraw_lib__1_4edge()],
// 0 BFC INVERTNEXT
  [0,"BFC","INVERTNEXT"],
// 1 16 12 -2 -20 -2 0 0 0 0 2 0 4 0 1-4cyli.dat
  [1,16,12,-2,-20,-2,0,0,0,0,2,0,4,0, ldraw_lib__1_4cyli()],
// 0 BFC INVERTNEXT
  [0,"BFC","INVERTNEXT"],
// 1 16 12 -2 -16 -2 0 0 0 0 2 0 2 0 1-4cyls.dat
  [1,16,12,-2,-16,-2,0,0,0,0,2,0,2,0, ldraw_lib__1_4cyls()],
// 0 BFC INVERTNEXT
  [0,"BFC","INVERTNEXT"],
// 1 16 10 -2 -14 0 2 0 0 0 2 -2 0 0 1-4cyls.dat
  [1,16,10,-2,-14,0,2,0,0,0,2,-2,0,0, ldraw_lib__1_4cyls()],
// 1 16 12 -2 -14 -2 0 0 0 0 2 -2 1 0 1-4edge.dat
  [1,16,12,-2,-14,-2,0,0,0,0,2,-2,1,0, ldraw_lib__1_4edge()],
// 
// 1 16 8 -14 -20 2 0 0 0 0 -2 0 4 0 1-4cylo.dat
  [1,16,8,-14,-20,2,0,0,0,0,-2,0,4,0, ldraw_lib__1_4cylo()],
// 1 16 8 -14 -20 2 0 0 0 0 -2 0 1 0 1-4chrd.dat
  [1,16,8,-14,-20,2,0,0,0,0,-2,0,1,0, ldraw_lib__1_4chrd()],
// 1 16 8 -14 -16 2 0 0 0 0 -2 0 -1 0 1-4chrd.dat
  [1,16,8,-14,-16,2,0,0,0,0,-2,0,-1,0, ldraw_lib__1_4chrd()],
// 
// 2 24 20 0 -20 20 8 -20
  [2,24,20,0,-20,20,8,-20],
// 3 16 20 0 -20 12 0 -20 20 8 -20
  [3,16,20,0,-20,12,0,-20,20,8,-20],
// 3 16 20 8 -20 12 0 -20 10 0 -20
  [3,16,20,8,-20,12,0,-20,10,0,-20],
// 4 16 10 0 -20 -10 0 -20 -20 8 -20 20 8 -20
  [4,16,10,0,-20,-10,0,-20,-20,8,-20,20,8,-20],
// 3 16 -10 0 -20 -12 0 -20 -20 8 -20
  [3,16,-10,0,-20,-12,0,-20,-20,8,-20],
// 3 16 20 0 -20 20 8 -20 20 0 -12
  [3,16,20,0,-20,20,8,-20,20,0,-12],
// 2 24 20 0 -20 20 0 -12
  [2,24,20,0,-20,20,0,-12],
// 2 24 12 0 -20 20 0 -20
  [2,24,12,0,-20,20,0,-20],
// 3 16 12 0 -20 20 0 -20 20 0 -12
  [3,16,12,0,-20,20,0,-20,20,0,-12],
// 4 16 12 0 -16 12 0 -20 20 0 -12 16 0 -12
  [4,16,12,0,-16,12,0,-20,20,0,-12,16,0,-12],
// 4 16 14 0 -12 12 0 -14 12 0 -16 16 0 -12
  [4,16,14,0,-12,12,0,-14,12,0,-16,16,0,-12],
// 4 16 10 0 -14 12 0 -14 14 0 -12 14 0 -10
  [4,16,10,0,-14,12,0,-14,14,0,-12,14,0,-10],
// 4 16 10 0 -14 14 0 -10 0 0 0 -10 0 -14
  [4,16,10,0,-14,14,0,-10,0,0,0,-10,0,-14],
];
module ldraw_lib__s__3130s01(step=0, col=false, unit=2/5, alt=false, line=0.2, solid=!$preview)
    makepoly(ldraw_lib__s__3130s01(), step=step, col=col, unit=unit, alt=alt, line=line, solid=solid);
ldraw_lib__s__3130s01(line=0.2);
// file: ../p/recte4.scad
use <../lib.scad>
function ldraw_lib__recte4() = [
// 0 Rectangle Empty with 4 Edges
// 0 Name: recte4.dat
// 0 Author: Steffen [Steffen]
// 0 !LDRAW_ORG Primitive UPDATE 2010-03
// 0 !LICENSE Licensed under CC BY 4.0 : see CAreadme.txt
// 
// 0 BFC CERTIFY CCW
  [0,"BFC","CERTIFY"],
  [0,"BFC","CCW"],
// 
// 0 !HISTORY 2010-12-31 [PTadmin] Official Update 2010-03
// 
// 
// 2 24 1 0 1 -1 0 1
  [2,24,1,0,1,-1,0,1],
// 2 24 -1 0 1 -1 0 -1
  [2,24,-1,0,1,-1,0,-1],
// 2 24 -1 0 -1 1 0 -1
  [2,24,-1,0,-1,1,0,-1],
// 2 24 1 0 -1 1 0 1
  [2,24,1,0,-1,1,0,1],
];
module ldraw_lib__recte4(step=0, col=false, unit=2/5, alt=false, line=0.2, solid=!$preview)
    makepoly(ldraw_lib__recte4(), step=step, col=col, unit=unit, alt=alt, line=line, solid=solid);
ldraw_lib__recte4(line=0.2);
// file: ../p/box5.scad
use <../lib.scad>
function ldraw_lib__box5() = [
// 0 Box with 5 Faces and All Edges
// 0 Name: box5.dat
// 0 Author: James Jessiman
// 0 !LDRAW_ORG Primitive UPDATE 2012-01
// 0 !LICENSE Licensed under CC BY 2.0 and CC BY 4.0 : see CAreadme.txt
// 
// 0 BFC CERTIFY CCW
  [0,"BFC","CERTIFY"],
  [0,"BFC","CCW"],
// 
// 0 !HISTORY 2002-04-03 [sbliss] Modified for BFC compliance
// 0 !HISTORY 2002-04-25 [PTadmin] Official Update 2002-02
// 0 !HISTORY 2007-06-24 [PTadmin] Header formatted for Contributor Agreement
// 0 !HISTORY 2008-07-01 [PTadmin] Official Update 2008-01
// 0 !HISTORY 2012-02-16 [Philo] Changed to CCW
// 0 !HISTORY 2012-03-30 [PTadmin] Official Update 2012-01
// 
// 
// 2 24 1 1 1 -1 1 1
  [2,24,1,1,1,-1,1,1],
// 2 24 -1 1 1 -1 1 -1
  [2,24,-1,1,1,-1,1,-1],
// 2 24 -1 1 -1 1 1 -1
  [2,24,-1,1,-1,1,1,-1],
// 2 24 1 1 -1 1 1 1
  [2,24,1,1,-1,1,1,1],
// 2 24 1 0 1 -1 0 1
  [2,24,1,0,1,-1,0,1],
// 2 24 -1 0 1 -1 0 -1
  [2,24,-1,0,1,-1,0,-1],
// 2 24 -1 0 -1 1 0 -1
  [2,24,-1,0,-1,1,0,-1],
// 2 24 1 0 -1 1 0 1
  [2,24,1,0,-1,1,0,1],
// 2 24 1 0 1 1 1 1
  [2,24,1,0,1,1,1,1],
// 2 24 -1 0 1 -1 1 1
  [2,24,-1,0,1,-1,1,1],
// 2 24 1 0 -1 1 1 -1
  [2,24,1,0,-1,1,1,-1],
// 2 24 -1 0 -1 -1 1 -1
  [2,24,-1,0,-1,-1,1,-1],
// 4 16 -1 1 1 1 1 1 1 1 -1 -1 1 -1
  [4,16,-1,1,1,1,1,1,1,1,-1,-1,1,-1],
// 4 16 -1 1 1 -1 0 1 1 0 1 1 1 1
  [4,16,-1,1,1,-1,0,1,1,0,1,1,1,1],
// 4 16 -1 1 -1 -1 0 -1 -1 0 1 -1 1 1
  [4,16,-1,1,-1,-1,0,-1,-1,0,1,-1,1,1],
// 4 16 1 1 -1 1 0 -1 -1 0 -1 -1 1 -1
  [4,16,1,1,-1,1,0,-1,-1,0,-1,-1,1,-1],
// 4 16 1 1 1 1 0 1 1 0 -1 1 1 -1
  [4,16,1,1,1,1,0,1,1,0,-1,1,1,-1],
];
makepoly(ldraw_lib__box5(), line=0.2);
// main file
use <../lib.scad>
use <../p/box5.scad>
use <../p/recte4.scad>
use <s/3130s01.scad>
use <../p/stud4.scad>
function ldraw_lib__3130() = [
// 0 Panel  2 x  2 x  1 Side Panels
// 0 Name: 3130.dat
// 0 Author: Gerald Lasser [GeraldLasser]
// 0 !LDRAW_ORG Part UPDATE 2024-06
// 0 !LICENSE Licensed under CC BY 4.0 : see CAreadme.txt
// 
// 0 BFC CERTIFY CCW
  [0,"BFC","CERTIFY"],
  [0,"BFC","CCW"],
// 
// 0 !HISTORY 2024-07-29 [OrionP] Official Update 2024-06
// 
// 
// 0 // Bottom
// 1 16 0 4 0 1 0 0 0 -1 0 0 0 1 stud4.dat
  [1,16,0,4,0,1,0,0,0,-1,0,0,0,1, ldraw_lib__stud4()],
// 0 BFC INVERTNEXT
  [0,"BFC","INVERTNEXT"],
// 1 16 0 8 0 16 0 0 0 -4 0 0 0 16 box5.dat
  [1,16,0,8,0,16,0,0,0,-4,0,0,0,16, ldraw_lib__box5()],
// 4 16 20 8 20 16 8 16 -16 8 16 -20 8 20
  [4,16,20,8,20,16,8,16,-16,8,16,-20,8,20],
// 4 16 -20 8 -20 -16 8 -16 16 8 -16 20 8 -20
  [4,16,-20,8,-20,-16,8,-16,16,8,-16,20,8,-20],
// 4 16 20 8 -20 16 8 -16 16 8 16 20 8 20
  [4,16,20,8,-20,16,8,-16,16,8,16,20,8,20],
// 4 16 -20 8 20 -16 8 16 -16 8 -16 -20 8 -20
  [4,16,-20,8,20,-16,8,16,-16,8,-16,-20,8,-20],
// 1 16 0 8 0 20 0 0 0 1 0 0 0 20 recte4.dat
  [1,16,0,8,0,20,0,0,0,1,0,0,0,20, ldraw_lib__recte4()],
// 
// 1 16 0 0 0 1 0 0 0 1 0 0 0 1 s\3130s01.dat
  [1,16,0,0,0,1,0,0,0,1,0,0,0,1, ldraw_lib__s__3130s01()],
// 1 16 0 0 0 0 0 1 0 1 0 -1 0 0 s\3130s01.dat
  [1,16,0,0,0,0,0,1,0,1,0,-1,0,0, ldraw_lib__s__3130s01()],
// 1 16 0 0 0 -1 0 0 0 1 0 0 0 -1 s\3130s01.dat
  [1,16,0,0,0,-1,0,0,0,1,0,0,0,-1, ldraw_lib__s__3130s01()],
// 1 16 0 0 0 0 0 -1 0 1 0 1 0 0 s\3130s01.dat
  [1,16,0,0,0,0,0,-1,0,1,0,1,0,0, ldraw_lib__s__3130s01()],
];
module ldraw_lib__3130(step=0, col=false, unit=2/5, alt=false, line=0.2, solid=!$preview)
    makepoly(ldraw_lib__3130(), step=step, col=col, unit=unit, alt=alt, line=line, solid=solid);
ldraw_lib__3130(line=0.2);
